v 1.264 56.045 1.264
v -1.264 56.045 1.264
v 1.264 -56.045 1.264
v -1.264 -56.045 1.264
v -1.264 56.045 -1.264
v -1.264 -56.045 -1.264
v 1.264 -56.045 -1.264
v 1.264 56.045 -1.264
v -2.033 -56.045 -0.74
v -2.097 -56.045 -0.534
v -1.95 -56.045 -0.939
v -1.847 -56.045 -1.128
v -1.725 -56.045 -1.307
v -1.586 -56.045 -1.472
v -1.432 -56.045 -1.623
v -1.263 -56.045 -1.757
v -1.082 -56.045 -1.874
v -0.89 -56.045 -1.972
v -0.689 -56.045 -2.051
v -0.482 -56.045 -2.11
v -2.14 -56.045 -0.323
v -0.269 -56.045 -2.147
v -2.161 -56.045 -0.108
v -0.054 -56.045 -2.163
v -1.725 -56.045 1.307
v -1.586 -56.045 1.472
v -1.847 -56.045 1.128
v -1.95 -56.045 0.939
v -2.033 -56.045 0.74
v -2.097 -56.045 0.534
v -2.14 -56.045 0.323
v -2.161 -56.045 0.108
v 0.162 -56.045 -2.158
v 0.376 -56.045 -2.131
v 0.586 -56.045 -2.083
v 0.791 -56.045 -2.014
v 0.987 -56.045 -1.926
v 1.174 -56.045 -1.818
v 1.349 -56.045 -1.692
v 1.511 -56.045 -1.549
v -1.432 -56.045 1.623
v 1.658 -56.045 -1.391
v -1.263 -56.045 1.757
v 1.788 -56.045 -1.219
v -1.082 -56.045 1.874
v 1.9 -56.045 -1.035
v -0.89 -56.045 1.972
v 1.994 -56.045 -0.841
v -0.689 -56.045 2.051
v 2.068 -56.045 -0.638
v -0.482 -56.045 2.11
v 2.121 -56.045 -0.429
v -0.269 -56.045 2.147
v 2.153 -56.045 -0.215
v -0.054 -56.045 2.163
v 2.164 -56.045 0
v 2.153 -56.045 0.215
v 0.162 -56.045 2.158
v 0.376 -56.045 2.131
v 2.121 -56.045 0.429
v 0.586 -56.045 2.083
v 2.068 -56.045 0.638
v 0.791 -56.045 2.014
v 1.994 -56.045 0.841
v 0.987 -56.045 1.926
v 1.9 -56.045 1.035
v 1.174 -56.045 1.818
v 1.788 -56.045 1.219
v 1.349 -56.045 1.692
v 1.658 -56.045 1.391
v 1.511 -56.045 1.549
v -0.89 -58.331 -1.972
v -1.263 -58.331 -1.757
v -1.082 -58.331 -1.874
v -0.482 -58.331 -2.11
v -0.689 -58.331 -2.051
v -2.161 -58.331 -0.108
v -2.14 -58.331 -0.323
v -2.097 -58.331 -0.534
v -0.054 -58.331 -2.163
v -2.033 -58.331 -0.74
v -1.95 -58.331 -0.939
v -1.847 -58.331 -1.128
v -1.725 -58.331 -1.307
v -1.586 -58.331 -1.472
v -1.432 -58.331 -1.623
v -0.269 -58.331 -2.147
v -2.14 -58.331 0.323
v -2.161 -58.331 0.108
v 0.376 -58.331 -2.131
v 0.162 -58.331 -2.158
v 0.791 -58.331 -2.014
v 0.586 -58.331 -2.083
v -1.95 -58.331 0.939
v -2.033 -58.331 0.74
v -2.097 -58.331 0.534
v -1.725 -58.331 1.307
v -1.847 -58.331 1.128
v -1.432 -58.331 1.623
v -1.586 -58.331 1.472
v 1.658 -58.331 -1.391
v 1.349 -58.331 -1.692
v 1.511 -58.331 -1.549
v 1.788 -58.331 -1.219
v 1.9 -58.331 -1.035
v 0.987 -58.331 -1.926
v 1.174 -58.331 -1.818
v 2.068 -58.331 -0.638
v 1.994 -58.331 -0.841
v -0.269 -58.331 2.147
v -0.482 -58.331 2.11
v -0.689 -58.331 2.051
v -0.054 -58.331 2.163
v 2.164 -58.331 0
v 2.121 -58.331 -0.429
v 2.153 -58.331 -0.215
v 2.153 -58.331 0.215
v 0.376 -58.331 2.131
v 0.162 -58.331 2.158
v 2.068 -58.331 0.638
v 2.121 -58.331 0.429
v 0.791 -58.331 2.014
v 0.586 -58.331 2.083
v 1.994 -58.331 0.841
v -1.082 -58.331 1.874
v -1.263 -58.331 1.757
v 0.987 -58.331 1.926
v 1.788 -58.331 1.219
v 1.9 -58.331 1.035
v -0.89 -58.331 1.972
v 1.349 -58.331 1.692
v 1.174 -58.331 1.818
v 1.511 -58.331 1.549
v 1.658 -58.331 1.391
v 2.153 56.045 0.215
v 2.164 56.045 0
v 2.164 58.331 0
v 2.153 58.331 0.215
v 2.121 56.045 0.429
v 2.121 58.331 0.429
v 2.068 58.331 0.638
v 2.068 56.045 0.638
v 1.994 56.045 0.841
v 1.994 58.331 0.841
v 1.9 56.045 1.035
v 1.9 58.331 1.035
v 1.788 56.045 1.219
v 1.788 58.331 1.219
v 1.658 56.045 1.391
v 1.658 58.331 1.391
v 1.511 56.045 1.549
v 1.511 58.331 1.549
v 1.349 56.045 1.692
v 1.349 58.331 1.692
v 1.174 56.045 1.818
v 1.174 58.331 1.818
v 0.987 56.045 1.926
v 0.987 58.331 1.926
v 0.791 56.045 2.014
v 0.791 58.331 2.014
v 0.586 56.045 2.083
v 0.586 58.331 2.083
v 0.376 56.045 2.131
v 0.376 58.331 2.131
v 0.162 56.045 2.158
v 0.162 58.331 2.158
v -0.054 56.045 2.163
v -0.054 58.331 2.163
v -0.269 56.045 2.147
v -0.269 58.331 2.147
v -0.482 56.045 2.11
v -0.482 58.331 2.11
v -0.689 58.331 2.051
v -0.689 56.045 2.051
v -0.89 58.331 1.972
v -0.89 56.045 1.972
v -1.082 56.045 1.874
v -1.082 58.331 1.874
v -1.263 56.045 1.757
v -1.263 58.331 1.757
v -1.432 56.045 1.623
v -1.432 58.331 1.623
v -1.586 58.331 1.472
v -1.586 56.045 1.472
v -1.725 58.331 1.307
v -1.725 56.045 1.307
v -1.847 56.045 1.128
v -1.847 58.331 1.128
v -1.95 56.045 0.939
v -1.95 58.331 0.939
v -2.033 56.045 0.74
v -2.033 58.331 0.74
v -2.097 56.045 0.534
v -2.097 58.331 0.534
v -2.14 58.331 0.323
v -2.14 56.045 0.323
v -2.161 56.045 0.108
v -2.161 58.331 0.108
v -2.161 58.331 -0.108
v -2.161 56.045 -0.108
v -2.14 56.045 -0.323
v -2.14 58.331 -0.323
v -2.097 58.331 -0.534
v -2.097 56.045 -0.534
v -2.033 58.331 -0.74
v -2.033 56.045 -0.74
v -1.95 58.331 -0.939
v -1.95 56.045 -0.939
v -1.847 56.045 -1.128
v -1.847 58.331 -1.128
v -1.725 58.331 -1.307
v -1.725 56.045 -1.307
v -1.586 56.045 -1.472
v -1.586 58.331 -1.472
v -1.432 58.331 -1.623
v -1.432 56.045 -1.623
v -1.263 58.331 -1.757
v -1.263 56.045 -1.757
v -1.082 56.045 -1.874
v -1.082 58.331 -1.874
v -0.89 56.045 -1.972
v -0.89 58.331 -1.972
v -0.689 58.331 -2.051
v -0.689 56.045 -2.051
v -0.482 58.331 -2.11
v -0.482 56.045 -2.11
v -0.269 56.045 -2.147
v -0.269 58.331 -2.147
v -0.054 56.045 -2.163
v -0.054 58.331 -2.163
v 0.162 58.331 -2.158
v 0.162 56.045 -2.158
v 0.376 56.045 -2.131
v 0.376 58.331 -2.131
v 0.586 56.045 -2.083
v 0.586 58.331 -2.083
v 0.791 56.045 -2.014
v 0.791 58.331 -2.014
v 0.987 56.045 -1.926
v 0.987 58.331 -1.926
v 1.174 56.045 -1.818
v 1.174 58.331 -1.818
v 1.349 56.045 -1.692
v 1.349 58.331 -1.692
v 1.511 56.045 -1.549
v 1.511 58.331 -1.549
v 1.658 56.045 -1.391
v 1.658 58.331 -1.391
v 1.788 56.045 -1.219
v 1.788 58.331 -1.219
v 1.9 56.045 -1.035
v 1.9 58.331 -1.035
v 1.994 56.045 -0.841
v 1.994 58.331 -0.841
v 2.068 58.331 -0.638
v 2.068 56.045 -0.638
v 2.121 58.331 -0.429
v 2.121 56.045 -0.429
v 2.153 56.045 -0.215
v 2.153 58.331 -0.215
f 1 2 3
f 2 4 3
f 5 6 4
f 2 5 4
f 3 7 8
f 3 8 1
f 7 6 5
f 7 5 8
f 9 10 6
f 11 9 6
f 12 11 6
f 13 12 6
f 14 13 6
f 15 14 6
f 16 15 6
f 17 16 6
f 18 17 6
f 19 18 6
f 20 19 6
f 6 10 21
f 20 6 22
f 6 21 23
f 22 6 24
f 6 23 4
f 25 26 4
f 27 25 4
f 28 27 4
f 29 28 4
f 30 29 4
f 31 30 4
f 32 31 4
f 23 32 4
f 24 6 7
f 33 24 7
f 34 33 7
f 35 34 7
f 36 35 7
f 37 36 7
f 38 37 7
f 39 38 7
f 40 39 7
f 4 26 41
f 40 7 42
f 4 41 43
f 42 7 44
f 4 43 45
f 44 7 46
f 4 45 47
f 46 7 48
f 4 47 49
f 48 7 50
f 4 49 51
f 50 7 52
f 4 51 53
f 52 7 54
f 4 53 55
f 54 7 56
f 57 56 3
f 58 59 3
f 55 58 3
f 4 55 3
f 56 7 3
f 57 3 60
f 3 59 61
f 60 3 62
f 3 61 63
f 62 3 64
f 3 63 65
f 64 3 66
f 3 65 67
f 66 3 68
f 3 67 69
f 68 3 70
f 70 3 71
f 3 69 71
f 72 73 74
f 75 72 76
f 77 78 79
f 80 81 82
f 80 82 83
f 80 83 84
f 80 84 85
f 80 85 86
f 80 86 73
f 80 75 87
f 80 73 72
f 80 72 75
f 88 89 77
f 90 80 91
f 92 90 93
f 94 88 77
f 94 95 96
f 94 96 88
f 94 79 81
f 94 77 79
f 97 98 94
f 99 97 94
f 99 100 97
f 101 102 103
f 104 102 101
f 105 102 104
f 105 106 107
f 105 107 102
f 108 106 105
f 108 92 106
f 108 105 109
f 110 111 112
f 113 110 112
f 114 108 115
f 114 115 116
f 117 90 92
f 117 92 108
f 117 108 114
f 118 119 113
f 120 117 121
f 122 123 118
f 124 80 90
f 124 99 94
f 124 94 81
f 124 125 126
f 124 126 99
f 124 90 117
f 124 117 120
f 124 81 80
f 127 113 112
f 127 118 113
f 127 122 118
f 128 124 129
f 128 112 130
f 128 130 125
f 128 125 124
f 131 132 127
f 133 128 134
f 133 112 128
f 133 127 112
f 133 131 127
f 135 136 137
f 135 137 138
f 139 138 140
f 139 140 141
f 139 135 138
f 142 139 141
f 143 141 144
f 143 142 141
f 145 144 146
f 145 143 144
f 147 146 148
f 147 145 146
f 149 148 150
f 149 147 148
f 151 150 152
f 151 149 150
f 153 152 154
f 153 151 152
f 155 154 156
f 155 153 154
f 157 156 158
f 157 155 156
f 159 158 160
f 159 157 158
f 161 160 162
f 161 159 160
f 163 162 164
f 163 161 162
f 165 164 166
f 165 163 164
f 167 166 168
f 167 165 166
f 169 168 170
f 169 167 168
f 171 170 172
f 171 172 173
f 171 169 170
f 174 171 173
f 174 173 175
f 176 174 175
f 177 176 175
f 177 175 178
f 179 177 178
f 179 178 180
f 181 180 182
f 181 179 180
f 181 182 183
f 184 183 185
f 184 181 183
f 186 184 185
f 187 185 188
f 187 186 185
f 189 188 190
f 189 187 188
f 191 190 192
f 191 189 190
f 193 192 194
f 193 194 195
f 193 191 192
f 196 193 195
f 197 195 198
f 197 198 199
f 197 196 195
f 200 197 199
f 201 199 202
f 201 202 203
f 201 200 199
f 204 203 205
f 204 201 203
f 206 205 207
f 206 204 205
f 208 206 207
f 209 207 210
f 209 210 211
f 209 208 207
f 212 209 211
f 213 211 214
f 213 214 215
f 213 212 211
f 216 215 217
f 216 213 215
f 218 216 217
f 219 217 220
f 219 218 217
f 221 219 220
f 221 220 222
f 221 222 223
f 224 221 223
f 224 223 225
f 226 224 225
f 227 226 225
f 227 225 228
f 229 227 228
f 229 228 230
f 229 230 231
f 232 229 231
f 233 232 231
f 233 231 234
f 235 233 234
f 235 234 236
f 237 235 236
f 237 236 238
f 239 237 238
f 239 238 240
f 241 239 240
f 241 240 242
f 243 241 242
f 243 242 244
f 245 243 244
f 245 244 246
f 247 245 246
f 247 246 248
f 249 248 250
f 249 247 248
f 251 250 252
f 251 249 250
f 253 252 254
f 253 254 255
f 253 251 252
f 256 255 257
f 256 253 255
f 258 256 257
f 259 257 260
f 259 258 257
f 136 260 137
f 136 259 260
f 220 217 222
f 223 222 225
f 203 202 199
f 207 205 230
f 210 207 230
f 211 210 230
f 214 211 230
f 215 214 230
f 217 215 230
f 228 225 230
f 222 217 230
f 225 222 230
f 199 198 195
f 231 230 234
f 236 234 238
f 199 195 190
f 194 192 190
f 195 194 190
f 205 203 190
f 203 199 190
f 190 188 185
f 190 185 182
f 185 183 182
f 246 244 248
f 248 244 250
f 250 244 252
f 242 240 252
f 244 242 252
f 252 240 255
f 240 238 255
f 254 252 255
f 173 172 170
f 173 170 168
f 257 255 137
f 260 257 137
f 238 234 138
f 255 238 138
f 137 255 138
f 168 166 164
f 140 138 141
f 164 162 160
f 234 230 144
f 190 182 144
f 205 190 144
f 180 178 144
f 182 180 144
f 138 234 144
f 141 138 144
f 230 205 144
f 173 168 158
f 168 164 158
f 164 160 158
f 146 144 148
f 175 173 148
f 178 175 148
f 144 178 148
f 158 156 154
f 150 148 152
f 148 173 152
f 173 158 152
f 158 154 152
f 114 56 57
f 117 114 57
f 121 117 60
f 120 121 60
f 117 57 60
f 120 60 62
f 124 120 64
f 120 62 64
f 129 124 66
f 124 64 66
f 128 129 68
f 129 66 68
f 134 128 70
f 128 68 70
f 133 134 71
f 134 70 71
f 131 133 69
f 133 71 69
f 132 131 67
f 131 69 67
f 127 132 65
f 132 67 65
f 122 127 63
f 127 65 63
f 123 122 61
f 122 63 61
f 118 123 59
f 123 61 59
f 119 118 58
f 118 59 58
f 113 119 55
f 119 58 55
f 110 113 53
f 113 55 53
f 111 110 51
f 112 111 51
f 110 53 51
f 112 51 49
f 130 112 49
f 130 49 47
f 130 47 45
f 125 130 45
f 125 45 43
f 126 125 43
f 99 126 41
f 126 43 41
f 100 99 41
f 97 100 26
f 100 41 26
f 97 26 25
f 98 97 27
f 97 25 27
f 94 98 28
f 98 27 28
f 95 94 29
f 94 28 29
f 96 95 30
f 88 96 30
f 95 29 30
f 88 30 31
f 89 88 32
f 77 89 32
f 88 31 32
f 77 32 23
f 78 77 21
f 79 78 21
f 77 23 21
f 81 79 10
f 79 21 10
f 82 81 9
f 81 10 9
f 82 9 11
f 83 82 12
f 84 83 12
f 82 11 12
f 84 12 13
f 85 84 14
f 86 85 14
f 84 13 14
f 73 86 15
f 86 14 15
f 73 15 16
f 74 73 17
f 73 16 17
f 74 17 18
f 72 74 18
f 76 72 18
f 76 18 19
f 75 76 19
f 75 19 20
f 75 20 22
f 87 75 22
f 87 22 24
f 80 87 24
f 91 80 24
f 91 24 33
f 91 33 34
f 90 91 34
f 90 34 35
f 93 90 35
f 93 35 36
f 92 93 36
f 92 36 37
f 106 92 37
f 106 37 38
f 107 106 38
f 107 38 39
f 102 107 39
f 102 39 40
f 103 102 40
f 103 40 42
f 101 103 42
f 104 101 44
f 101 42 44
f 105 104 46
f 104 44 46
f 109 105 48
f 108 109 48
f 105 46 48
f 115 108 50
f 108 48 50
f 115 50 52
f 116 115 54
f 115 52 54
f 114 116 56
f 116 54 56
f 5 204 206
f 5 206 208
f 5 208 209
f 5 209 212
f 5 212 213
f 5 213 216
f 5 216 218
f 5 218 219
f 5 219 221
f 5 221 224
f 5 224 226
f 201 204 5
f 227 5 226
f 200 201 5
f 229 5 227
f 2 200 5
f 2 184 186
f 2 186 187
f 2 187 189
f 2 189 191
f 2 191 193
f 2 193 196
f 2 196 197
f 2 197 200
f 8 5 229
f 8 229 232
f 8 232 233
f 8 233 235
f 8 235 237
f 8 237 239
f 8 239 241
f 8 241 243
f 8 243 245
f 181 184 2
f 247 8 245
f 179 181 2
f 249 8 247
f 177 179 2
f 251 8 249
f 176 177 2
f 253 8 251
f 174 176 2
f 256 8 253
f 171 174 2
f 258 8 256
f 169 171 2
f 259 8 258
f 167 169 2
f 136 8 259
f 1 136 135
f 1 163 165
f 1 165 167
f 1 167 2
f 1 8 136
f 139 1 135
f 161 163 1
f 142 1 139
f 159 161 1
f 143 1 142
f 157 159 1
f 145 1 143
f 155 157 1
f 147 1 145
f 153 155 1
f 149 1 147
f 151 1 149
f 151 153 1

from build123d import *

# Parameters (mm, degrees)
F0_W          = 2.528925892
F0_H          = 2.5279636029
F1_DEPTH      = 56.0451
F1_DEPTH_BACK = 56.0451
F2_R          = 2.1639792623
F3_DEPTH      = 2.286


# Not quite as in the source:
# - a pattern or mirror of a feature is missing from the dataset's text; its kind, count and spacing are read off the source's solid


with BuildPart() as f1:
    # F0 (on Front) → F1 (new body, two sides)
    with BuildSketch(Plane.XZ) as f1_sk:
        Rectangle(F0_W, F0_H)
    extrude(amount=F1_DEPTH)
    extrude(f1_sk.sketch, amount=-F1_DEPTH_BACK)

    # F2 (on face) → F3 (join)
    with BuildSketch(Plane.XZ.offset(56.0451)):
        Circle(F2_R)
    f3 = extrude(amount=F3_DEPTH)

    # F3_copies: F3 across plane
    add(f3.mirror(Plane.ZX))


solid = f1.part
